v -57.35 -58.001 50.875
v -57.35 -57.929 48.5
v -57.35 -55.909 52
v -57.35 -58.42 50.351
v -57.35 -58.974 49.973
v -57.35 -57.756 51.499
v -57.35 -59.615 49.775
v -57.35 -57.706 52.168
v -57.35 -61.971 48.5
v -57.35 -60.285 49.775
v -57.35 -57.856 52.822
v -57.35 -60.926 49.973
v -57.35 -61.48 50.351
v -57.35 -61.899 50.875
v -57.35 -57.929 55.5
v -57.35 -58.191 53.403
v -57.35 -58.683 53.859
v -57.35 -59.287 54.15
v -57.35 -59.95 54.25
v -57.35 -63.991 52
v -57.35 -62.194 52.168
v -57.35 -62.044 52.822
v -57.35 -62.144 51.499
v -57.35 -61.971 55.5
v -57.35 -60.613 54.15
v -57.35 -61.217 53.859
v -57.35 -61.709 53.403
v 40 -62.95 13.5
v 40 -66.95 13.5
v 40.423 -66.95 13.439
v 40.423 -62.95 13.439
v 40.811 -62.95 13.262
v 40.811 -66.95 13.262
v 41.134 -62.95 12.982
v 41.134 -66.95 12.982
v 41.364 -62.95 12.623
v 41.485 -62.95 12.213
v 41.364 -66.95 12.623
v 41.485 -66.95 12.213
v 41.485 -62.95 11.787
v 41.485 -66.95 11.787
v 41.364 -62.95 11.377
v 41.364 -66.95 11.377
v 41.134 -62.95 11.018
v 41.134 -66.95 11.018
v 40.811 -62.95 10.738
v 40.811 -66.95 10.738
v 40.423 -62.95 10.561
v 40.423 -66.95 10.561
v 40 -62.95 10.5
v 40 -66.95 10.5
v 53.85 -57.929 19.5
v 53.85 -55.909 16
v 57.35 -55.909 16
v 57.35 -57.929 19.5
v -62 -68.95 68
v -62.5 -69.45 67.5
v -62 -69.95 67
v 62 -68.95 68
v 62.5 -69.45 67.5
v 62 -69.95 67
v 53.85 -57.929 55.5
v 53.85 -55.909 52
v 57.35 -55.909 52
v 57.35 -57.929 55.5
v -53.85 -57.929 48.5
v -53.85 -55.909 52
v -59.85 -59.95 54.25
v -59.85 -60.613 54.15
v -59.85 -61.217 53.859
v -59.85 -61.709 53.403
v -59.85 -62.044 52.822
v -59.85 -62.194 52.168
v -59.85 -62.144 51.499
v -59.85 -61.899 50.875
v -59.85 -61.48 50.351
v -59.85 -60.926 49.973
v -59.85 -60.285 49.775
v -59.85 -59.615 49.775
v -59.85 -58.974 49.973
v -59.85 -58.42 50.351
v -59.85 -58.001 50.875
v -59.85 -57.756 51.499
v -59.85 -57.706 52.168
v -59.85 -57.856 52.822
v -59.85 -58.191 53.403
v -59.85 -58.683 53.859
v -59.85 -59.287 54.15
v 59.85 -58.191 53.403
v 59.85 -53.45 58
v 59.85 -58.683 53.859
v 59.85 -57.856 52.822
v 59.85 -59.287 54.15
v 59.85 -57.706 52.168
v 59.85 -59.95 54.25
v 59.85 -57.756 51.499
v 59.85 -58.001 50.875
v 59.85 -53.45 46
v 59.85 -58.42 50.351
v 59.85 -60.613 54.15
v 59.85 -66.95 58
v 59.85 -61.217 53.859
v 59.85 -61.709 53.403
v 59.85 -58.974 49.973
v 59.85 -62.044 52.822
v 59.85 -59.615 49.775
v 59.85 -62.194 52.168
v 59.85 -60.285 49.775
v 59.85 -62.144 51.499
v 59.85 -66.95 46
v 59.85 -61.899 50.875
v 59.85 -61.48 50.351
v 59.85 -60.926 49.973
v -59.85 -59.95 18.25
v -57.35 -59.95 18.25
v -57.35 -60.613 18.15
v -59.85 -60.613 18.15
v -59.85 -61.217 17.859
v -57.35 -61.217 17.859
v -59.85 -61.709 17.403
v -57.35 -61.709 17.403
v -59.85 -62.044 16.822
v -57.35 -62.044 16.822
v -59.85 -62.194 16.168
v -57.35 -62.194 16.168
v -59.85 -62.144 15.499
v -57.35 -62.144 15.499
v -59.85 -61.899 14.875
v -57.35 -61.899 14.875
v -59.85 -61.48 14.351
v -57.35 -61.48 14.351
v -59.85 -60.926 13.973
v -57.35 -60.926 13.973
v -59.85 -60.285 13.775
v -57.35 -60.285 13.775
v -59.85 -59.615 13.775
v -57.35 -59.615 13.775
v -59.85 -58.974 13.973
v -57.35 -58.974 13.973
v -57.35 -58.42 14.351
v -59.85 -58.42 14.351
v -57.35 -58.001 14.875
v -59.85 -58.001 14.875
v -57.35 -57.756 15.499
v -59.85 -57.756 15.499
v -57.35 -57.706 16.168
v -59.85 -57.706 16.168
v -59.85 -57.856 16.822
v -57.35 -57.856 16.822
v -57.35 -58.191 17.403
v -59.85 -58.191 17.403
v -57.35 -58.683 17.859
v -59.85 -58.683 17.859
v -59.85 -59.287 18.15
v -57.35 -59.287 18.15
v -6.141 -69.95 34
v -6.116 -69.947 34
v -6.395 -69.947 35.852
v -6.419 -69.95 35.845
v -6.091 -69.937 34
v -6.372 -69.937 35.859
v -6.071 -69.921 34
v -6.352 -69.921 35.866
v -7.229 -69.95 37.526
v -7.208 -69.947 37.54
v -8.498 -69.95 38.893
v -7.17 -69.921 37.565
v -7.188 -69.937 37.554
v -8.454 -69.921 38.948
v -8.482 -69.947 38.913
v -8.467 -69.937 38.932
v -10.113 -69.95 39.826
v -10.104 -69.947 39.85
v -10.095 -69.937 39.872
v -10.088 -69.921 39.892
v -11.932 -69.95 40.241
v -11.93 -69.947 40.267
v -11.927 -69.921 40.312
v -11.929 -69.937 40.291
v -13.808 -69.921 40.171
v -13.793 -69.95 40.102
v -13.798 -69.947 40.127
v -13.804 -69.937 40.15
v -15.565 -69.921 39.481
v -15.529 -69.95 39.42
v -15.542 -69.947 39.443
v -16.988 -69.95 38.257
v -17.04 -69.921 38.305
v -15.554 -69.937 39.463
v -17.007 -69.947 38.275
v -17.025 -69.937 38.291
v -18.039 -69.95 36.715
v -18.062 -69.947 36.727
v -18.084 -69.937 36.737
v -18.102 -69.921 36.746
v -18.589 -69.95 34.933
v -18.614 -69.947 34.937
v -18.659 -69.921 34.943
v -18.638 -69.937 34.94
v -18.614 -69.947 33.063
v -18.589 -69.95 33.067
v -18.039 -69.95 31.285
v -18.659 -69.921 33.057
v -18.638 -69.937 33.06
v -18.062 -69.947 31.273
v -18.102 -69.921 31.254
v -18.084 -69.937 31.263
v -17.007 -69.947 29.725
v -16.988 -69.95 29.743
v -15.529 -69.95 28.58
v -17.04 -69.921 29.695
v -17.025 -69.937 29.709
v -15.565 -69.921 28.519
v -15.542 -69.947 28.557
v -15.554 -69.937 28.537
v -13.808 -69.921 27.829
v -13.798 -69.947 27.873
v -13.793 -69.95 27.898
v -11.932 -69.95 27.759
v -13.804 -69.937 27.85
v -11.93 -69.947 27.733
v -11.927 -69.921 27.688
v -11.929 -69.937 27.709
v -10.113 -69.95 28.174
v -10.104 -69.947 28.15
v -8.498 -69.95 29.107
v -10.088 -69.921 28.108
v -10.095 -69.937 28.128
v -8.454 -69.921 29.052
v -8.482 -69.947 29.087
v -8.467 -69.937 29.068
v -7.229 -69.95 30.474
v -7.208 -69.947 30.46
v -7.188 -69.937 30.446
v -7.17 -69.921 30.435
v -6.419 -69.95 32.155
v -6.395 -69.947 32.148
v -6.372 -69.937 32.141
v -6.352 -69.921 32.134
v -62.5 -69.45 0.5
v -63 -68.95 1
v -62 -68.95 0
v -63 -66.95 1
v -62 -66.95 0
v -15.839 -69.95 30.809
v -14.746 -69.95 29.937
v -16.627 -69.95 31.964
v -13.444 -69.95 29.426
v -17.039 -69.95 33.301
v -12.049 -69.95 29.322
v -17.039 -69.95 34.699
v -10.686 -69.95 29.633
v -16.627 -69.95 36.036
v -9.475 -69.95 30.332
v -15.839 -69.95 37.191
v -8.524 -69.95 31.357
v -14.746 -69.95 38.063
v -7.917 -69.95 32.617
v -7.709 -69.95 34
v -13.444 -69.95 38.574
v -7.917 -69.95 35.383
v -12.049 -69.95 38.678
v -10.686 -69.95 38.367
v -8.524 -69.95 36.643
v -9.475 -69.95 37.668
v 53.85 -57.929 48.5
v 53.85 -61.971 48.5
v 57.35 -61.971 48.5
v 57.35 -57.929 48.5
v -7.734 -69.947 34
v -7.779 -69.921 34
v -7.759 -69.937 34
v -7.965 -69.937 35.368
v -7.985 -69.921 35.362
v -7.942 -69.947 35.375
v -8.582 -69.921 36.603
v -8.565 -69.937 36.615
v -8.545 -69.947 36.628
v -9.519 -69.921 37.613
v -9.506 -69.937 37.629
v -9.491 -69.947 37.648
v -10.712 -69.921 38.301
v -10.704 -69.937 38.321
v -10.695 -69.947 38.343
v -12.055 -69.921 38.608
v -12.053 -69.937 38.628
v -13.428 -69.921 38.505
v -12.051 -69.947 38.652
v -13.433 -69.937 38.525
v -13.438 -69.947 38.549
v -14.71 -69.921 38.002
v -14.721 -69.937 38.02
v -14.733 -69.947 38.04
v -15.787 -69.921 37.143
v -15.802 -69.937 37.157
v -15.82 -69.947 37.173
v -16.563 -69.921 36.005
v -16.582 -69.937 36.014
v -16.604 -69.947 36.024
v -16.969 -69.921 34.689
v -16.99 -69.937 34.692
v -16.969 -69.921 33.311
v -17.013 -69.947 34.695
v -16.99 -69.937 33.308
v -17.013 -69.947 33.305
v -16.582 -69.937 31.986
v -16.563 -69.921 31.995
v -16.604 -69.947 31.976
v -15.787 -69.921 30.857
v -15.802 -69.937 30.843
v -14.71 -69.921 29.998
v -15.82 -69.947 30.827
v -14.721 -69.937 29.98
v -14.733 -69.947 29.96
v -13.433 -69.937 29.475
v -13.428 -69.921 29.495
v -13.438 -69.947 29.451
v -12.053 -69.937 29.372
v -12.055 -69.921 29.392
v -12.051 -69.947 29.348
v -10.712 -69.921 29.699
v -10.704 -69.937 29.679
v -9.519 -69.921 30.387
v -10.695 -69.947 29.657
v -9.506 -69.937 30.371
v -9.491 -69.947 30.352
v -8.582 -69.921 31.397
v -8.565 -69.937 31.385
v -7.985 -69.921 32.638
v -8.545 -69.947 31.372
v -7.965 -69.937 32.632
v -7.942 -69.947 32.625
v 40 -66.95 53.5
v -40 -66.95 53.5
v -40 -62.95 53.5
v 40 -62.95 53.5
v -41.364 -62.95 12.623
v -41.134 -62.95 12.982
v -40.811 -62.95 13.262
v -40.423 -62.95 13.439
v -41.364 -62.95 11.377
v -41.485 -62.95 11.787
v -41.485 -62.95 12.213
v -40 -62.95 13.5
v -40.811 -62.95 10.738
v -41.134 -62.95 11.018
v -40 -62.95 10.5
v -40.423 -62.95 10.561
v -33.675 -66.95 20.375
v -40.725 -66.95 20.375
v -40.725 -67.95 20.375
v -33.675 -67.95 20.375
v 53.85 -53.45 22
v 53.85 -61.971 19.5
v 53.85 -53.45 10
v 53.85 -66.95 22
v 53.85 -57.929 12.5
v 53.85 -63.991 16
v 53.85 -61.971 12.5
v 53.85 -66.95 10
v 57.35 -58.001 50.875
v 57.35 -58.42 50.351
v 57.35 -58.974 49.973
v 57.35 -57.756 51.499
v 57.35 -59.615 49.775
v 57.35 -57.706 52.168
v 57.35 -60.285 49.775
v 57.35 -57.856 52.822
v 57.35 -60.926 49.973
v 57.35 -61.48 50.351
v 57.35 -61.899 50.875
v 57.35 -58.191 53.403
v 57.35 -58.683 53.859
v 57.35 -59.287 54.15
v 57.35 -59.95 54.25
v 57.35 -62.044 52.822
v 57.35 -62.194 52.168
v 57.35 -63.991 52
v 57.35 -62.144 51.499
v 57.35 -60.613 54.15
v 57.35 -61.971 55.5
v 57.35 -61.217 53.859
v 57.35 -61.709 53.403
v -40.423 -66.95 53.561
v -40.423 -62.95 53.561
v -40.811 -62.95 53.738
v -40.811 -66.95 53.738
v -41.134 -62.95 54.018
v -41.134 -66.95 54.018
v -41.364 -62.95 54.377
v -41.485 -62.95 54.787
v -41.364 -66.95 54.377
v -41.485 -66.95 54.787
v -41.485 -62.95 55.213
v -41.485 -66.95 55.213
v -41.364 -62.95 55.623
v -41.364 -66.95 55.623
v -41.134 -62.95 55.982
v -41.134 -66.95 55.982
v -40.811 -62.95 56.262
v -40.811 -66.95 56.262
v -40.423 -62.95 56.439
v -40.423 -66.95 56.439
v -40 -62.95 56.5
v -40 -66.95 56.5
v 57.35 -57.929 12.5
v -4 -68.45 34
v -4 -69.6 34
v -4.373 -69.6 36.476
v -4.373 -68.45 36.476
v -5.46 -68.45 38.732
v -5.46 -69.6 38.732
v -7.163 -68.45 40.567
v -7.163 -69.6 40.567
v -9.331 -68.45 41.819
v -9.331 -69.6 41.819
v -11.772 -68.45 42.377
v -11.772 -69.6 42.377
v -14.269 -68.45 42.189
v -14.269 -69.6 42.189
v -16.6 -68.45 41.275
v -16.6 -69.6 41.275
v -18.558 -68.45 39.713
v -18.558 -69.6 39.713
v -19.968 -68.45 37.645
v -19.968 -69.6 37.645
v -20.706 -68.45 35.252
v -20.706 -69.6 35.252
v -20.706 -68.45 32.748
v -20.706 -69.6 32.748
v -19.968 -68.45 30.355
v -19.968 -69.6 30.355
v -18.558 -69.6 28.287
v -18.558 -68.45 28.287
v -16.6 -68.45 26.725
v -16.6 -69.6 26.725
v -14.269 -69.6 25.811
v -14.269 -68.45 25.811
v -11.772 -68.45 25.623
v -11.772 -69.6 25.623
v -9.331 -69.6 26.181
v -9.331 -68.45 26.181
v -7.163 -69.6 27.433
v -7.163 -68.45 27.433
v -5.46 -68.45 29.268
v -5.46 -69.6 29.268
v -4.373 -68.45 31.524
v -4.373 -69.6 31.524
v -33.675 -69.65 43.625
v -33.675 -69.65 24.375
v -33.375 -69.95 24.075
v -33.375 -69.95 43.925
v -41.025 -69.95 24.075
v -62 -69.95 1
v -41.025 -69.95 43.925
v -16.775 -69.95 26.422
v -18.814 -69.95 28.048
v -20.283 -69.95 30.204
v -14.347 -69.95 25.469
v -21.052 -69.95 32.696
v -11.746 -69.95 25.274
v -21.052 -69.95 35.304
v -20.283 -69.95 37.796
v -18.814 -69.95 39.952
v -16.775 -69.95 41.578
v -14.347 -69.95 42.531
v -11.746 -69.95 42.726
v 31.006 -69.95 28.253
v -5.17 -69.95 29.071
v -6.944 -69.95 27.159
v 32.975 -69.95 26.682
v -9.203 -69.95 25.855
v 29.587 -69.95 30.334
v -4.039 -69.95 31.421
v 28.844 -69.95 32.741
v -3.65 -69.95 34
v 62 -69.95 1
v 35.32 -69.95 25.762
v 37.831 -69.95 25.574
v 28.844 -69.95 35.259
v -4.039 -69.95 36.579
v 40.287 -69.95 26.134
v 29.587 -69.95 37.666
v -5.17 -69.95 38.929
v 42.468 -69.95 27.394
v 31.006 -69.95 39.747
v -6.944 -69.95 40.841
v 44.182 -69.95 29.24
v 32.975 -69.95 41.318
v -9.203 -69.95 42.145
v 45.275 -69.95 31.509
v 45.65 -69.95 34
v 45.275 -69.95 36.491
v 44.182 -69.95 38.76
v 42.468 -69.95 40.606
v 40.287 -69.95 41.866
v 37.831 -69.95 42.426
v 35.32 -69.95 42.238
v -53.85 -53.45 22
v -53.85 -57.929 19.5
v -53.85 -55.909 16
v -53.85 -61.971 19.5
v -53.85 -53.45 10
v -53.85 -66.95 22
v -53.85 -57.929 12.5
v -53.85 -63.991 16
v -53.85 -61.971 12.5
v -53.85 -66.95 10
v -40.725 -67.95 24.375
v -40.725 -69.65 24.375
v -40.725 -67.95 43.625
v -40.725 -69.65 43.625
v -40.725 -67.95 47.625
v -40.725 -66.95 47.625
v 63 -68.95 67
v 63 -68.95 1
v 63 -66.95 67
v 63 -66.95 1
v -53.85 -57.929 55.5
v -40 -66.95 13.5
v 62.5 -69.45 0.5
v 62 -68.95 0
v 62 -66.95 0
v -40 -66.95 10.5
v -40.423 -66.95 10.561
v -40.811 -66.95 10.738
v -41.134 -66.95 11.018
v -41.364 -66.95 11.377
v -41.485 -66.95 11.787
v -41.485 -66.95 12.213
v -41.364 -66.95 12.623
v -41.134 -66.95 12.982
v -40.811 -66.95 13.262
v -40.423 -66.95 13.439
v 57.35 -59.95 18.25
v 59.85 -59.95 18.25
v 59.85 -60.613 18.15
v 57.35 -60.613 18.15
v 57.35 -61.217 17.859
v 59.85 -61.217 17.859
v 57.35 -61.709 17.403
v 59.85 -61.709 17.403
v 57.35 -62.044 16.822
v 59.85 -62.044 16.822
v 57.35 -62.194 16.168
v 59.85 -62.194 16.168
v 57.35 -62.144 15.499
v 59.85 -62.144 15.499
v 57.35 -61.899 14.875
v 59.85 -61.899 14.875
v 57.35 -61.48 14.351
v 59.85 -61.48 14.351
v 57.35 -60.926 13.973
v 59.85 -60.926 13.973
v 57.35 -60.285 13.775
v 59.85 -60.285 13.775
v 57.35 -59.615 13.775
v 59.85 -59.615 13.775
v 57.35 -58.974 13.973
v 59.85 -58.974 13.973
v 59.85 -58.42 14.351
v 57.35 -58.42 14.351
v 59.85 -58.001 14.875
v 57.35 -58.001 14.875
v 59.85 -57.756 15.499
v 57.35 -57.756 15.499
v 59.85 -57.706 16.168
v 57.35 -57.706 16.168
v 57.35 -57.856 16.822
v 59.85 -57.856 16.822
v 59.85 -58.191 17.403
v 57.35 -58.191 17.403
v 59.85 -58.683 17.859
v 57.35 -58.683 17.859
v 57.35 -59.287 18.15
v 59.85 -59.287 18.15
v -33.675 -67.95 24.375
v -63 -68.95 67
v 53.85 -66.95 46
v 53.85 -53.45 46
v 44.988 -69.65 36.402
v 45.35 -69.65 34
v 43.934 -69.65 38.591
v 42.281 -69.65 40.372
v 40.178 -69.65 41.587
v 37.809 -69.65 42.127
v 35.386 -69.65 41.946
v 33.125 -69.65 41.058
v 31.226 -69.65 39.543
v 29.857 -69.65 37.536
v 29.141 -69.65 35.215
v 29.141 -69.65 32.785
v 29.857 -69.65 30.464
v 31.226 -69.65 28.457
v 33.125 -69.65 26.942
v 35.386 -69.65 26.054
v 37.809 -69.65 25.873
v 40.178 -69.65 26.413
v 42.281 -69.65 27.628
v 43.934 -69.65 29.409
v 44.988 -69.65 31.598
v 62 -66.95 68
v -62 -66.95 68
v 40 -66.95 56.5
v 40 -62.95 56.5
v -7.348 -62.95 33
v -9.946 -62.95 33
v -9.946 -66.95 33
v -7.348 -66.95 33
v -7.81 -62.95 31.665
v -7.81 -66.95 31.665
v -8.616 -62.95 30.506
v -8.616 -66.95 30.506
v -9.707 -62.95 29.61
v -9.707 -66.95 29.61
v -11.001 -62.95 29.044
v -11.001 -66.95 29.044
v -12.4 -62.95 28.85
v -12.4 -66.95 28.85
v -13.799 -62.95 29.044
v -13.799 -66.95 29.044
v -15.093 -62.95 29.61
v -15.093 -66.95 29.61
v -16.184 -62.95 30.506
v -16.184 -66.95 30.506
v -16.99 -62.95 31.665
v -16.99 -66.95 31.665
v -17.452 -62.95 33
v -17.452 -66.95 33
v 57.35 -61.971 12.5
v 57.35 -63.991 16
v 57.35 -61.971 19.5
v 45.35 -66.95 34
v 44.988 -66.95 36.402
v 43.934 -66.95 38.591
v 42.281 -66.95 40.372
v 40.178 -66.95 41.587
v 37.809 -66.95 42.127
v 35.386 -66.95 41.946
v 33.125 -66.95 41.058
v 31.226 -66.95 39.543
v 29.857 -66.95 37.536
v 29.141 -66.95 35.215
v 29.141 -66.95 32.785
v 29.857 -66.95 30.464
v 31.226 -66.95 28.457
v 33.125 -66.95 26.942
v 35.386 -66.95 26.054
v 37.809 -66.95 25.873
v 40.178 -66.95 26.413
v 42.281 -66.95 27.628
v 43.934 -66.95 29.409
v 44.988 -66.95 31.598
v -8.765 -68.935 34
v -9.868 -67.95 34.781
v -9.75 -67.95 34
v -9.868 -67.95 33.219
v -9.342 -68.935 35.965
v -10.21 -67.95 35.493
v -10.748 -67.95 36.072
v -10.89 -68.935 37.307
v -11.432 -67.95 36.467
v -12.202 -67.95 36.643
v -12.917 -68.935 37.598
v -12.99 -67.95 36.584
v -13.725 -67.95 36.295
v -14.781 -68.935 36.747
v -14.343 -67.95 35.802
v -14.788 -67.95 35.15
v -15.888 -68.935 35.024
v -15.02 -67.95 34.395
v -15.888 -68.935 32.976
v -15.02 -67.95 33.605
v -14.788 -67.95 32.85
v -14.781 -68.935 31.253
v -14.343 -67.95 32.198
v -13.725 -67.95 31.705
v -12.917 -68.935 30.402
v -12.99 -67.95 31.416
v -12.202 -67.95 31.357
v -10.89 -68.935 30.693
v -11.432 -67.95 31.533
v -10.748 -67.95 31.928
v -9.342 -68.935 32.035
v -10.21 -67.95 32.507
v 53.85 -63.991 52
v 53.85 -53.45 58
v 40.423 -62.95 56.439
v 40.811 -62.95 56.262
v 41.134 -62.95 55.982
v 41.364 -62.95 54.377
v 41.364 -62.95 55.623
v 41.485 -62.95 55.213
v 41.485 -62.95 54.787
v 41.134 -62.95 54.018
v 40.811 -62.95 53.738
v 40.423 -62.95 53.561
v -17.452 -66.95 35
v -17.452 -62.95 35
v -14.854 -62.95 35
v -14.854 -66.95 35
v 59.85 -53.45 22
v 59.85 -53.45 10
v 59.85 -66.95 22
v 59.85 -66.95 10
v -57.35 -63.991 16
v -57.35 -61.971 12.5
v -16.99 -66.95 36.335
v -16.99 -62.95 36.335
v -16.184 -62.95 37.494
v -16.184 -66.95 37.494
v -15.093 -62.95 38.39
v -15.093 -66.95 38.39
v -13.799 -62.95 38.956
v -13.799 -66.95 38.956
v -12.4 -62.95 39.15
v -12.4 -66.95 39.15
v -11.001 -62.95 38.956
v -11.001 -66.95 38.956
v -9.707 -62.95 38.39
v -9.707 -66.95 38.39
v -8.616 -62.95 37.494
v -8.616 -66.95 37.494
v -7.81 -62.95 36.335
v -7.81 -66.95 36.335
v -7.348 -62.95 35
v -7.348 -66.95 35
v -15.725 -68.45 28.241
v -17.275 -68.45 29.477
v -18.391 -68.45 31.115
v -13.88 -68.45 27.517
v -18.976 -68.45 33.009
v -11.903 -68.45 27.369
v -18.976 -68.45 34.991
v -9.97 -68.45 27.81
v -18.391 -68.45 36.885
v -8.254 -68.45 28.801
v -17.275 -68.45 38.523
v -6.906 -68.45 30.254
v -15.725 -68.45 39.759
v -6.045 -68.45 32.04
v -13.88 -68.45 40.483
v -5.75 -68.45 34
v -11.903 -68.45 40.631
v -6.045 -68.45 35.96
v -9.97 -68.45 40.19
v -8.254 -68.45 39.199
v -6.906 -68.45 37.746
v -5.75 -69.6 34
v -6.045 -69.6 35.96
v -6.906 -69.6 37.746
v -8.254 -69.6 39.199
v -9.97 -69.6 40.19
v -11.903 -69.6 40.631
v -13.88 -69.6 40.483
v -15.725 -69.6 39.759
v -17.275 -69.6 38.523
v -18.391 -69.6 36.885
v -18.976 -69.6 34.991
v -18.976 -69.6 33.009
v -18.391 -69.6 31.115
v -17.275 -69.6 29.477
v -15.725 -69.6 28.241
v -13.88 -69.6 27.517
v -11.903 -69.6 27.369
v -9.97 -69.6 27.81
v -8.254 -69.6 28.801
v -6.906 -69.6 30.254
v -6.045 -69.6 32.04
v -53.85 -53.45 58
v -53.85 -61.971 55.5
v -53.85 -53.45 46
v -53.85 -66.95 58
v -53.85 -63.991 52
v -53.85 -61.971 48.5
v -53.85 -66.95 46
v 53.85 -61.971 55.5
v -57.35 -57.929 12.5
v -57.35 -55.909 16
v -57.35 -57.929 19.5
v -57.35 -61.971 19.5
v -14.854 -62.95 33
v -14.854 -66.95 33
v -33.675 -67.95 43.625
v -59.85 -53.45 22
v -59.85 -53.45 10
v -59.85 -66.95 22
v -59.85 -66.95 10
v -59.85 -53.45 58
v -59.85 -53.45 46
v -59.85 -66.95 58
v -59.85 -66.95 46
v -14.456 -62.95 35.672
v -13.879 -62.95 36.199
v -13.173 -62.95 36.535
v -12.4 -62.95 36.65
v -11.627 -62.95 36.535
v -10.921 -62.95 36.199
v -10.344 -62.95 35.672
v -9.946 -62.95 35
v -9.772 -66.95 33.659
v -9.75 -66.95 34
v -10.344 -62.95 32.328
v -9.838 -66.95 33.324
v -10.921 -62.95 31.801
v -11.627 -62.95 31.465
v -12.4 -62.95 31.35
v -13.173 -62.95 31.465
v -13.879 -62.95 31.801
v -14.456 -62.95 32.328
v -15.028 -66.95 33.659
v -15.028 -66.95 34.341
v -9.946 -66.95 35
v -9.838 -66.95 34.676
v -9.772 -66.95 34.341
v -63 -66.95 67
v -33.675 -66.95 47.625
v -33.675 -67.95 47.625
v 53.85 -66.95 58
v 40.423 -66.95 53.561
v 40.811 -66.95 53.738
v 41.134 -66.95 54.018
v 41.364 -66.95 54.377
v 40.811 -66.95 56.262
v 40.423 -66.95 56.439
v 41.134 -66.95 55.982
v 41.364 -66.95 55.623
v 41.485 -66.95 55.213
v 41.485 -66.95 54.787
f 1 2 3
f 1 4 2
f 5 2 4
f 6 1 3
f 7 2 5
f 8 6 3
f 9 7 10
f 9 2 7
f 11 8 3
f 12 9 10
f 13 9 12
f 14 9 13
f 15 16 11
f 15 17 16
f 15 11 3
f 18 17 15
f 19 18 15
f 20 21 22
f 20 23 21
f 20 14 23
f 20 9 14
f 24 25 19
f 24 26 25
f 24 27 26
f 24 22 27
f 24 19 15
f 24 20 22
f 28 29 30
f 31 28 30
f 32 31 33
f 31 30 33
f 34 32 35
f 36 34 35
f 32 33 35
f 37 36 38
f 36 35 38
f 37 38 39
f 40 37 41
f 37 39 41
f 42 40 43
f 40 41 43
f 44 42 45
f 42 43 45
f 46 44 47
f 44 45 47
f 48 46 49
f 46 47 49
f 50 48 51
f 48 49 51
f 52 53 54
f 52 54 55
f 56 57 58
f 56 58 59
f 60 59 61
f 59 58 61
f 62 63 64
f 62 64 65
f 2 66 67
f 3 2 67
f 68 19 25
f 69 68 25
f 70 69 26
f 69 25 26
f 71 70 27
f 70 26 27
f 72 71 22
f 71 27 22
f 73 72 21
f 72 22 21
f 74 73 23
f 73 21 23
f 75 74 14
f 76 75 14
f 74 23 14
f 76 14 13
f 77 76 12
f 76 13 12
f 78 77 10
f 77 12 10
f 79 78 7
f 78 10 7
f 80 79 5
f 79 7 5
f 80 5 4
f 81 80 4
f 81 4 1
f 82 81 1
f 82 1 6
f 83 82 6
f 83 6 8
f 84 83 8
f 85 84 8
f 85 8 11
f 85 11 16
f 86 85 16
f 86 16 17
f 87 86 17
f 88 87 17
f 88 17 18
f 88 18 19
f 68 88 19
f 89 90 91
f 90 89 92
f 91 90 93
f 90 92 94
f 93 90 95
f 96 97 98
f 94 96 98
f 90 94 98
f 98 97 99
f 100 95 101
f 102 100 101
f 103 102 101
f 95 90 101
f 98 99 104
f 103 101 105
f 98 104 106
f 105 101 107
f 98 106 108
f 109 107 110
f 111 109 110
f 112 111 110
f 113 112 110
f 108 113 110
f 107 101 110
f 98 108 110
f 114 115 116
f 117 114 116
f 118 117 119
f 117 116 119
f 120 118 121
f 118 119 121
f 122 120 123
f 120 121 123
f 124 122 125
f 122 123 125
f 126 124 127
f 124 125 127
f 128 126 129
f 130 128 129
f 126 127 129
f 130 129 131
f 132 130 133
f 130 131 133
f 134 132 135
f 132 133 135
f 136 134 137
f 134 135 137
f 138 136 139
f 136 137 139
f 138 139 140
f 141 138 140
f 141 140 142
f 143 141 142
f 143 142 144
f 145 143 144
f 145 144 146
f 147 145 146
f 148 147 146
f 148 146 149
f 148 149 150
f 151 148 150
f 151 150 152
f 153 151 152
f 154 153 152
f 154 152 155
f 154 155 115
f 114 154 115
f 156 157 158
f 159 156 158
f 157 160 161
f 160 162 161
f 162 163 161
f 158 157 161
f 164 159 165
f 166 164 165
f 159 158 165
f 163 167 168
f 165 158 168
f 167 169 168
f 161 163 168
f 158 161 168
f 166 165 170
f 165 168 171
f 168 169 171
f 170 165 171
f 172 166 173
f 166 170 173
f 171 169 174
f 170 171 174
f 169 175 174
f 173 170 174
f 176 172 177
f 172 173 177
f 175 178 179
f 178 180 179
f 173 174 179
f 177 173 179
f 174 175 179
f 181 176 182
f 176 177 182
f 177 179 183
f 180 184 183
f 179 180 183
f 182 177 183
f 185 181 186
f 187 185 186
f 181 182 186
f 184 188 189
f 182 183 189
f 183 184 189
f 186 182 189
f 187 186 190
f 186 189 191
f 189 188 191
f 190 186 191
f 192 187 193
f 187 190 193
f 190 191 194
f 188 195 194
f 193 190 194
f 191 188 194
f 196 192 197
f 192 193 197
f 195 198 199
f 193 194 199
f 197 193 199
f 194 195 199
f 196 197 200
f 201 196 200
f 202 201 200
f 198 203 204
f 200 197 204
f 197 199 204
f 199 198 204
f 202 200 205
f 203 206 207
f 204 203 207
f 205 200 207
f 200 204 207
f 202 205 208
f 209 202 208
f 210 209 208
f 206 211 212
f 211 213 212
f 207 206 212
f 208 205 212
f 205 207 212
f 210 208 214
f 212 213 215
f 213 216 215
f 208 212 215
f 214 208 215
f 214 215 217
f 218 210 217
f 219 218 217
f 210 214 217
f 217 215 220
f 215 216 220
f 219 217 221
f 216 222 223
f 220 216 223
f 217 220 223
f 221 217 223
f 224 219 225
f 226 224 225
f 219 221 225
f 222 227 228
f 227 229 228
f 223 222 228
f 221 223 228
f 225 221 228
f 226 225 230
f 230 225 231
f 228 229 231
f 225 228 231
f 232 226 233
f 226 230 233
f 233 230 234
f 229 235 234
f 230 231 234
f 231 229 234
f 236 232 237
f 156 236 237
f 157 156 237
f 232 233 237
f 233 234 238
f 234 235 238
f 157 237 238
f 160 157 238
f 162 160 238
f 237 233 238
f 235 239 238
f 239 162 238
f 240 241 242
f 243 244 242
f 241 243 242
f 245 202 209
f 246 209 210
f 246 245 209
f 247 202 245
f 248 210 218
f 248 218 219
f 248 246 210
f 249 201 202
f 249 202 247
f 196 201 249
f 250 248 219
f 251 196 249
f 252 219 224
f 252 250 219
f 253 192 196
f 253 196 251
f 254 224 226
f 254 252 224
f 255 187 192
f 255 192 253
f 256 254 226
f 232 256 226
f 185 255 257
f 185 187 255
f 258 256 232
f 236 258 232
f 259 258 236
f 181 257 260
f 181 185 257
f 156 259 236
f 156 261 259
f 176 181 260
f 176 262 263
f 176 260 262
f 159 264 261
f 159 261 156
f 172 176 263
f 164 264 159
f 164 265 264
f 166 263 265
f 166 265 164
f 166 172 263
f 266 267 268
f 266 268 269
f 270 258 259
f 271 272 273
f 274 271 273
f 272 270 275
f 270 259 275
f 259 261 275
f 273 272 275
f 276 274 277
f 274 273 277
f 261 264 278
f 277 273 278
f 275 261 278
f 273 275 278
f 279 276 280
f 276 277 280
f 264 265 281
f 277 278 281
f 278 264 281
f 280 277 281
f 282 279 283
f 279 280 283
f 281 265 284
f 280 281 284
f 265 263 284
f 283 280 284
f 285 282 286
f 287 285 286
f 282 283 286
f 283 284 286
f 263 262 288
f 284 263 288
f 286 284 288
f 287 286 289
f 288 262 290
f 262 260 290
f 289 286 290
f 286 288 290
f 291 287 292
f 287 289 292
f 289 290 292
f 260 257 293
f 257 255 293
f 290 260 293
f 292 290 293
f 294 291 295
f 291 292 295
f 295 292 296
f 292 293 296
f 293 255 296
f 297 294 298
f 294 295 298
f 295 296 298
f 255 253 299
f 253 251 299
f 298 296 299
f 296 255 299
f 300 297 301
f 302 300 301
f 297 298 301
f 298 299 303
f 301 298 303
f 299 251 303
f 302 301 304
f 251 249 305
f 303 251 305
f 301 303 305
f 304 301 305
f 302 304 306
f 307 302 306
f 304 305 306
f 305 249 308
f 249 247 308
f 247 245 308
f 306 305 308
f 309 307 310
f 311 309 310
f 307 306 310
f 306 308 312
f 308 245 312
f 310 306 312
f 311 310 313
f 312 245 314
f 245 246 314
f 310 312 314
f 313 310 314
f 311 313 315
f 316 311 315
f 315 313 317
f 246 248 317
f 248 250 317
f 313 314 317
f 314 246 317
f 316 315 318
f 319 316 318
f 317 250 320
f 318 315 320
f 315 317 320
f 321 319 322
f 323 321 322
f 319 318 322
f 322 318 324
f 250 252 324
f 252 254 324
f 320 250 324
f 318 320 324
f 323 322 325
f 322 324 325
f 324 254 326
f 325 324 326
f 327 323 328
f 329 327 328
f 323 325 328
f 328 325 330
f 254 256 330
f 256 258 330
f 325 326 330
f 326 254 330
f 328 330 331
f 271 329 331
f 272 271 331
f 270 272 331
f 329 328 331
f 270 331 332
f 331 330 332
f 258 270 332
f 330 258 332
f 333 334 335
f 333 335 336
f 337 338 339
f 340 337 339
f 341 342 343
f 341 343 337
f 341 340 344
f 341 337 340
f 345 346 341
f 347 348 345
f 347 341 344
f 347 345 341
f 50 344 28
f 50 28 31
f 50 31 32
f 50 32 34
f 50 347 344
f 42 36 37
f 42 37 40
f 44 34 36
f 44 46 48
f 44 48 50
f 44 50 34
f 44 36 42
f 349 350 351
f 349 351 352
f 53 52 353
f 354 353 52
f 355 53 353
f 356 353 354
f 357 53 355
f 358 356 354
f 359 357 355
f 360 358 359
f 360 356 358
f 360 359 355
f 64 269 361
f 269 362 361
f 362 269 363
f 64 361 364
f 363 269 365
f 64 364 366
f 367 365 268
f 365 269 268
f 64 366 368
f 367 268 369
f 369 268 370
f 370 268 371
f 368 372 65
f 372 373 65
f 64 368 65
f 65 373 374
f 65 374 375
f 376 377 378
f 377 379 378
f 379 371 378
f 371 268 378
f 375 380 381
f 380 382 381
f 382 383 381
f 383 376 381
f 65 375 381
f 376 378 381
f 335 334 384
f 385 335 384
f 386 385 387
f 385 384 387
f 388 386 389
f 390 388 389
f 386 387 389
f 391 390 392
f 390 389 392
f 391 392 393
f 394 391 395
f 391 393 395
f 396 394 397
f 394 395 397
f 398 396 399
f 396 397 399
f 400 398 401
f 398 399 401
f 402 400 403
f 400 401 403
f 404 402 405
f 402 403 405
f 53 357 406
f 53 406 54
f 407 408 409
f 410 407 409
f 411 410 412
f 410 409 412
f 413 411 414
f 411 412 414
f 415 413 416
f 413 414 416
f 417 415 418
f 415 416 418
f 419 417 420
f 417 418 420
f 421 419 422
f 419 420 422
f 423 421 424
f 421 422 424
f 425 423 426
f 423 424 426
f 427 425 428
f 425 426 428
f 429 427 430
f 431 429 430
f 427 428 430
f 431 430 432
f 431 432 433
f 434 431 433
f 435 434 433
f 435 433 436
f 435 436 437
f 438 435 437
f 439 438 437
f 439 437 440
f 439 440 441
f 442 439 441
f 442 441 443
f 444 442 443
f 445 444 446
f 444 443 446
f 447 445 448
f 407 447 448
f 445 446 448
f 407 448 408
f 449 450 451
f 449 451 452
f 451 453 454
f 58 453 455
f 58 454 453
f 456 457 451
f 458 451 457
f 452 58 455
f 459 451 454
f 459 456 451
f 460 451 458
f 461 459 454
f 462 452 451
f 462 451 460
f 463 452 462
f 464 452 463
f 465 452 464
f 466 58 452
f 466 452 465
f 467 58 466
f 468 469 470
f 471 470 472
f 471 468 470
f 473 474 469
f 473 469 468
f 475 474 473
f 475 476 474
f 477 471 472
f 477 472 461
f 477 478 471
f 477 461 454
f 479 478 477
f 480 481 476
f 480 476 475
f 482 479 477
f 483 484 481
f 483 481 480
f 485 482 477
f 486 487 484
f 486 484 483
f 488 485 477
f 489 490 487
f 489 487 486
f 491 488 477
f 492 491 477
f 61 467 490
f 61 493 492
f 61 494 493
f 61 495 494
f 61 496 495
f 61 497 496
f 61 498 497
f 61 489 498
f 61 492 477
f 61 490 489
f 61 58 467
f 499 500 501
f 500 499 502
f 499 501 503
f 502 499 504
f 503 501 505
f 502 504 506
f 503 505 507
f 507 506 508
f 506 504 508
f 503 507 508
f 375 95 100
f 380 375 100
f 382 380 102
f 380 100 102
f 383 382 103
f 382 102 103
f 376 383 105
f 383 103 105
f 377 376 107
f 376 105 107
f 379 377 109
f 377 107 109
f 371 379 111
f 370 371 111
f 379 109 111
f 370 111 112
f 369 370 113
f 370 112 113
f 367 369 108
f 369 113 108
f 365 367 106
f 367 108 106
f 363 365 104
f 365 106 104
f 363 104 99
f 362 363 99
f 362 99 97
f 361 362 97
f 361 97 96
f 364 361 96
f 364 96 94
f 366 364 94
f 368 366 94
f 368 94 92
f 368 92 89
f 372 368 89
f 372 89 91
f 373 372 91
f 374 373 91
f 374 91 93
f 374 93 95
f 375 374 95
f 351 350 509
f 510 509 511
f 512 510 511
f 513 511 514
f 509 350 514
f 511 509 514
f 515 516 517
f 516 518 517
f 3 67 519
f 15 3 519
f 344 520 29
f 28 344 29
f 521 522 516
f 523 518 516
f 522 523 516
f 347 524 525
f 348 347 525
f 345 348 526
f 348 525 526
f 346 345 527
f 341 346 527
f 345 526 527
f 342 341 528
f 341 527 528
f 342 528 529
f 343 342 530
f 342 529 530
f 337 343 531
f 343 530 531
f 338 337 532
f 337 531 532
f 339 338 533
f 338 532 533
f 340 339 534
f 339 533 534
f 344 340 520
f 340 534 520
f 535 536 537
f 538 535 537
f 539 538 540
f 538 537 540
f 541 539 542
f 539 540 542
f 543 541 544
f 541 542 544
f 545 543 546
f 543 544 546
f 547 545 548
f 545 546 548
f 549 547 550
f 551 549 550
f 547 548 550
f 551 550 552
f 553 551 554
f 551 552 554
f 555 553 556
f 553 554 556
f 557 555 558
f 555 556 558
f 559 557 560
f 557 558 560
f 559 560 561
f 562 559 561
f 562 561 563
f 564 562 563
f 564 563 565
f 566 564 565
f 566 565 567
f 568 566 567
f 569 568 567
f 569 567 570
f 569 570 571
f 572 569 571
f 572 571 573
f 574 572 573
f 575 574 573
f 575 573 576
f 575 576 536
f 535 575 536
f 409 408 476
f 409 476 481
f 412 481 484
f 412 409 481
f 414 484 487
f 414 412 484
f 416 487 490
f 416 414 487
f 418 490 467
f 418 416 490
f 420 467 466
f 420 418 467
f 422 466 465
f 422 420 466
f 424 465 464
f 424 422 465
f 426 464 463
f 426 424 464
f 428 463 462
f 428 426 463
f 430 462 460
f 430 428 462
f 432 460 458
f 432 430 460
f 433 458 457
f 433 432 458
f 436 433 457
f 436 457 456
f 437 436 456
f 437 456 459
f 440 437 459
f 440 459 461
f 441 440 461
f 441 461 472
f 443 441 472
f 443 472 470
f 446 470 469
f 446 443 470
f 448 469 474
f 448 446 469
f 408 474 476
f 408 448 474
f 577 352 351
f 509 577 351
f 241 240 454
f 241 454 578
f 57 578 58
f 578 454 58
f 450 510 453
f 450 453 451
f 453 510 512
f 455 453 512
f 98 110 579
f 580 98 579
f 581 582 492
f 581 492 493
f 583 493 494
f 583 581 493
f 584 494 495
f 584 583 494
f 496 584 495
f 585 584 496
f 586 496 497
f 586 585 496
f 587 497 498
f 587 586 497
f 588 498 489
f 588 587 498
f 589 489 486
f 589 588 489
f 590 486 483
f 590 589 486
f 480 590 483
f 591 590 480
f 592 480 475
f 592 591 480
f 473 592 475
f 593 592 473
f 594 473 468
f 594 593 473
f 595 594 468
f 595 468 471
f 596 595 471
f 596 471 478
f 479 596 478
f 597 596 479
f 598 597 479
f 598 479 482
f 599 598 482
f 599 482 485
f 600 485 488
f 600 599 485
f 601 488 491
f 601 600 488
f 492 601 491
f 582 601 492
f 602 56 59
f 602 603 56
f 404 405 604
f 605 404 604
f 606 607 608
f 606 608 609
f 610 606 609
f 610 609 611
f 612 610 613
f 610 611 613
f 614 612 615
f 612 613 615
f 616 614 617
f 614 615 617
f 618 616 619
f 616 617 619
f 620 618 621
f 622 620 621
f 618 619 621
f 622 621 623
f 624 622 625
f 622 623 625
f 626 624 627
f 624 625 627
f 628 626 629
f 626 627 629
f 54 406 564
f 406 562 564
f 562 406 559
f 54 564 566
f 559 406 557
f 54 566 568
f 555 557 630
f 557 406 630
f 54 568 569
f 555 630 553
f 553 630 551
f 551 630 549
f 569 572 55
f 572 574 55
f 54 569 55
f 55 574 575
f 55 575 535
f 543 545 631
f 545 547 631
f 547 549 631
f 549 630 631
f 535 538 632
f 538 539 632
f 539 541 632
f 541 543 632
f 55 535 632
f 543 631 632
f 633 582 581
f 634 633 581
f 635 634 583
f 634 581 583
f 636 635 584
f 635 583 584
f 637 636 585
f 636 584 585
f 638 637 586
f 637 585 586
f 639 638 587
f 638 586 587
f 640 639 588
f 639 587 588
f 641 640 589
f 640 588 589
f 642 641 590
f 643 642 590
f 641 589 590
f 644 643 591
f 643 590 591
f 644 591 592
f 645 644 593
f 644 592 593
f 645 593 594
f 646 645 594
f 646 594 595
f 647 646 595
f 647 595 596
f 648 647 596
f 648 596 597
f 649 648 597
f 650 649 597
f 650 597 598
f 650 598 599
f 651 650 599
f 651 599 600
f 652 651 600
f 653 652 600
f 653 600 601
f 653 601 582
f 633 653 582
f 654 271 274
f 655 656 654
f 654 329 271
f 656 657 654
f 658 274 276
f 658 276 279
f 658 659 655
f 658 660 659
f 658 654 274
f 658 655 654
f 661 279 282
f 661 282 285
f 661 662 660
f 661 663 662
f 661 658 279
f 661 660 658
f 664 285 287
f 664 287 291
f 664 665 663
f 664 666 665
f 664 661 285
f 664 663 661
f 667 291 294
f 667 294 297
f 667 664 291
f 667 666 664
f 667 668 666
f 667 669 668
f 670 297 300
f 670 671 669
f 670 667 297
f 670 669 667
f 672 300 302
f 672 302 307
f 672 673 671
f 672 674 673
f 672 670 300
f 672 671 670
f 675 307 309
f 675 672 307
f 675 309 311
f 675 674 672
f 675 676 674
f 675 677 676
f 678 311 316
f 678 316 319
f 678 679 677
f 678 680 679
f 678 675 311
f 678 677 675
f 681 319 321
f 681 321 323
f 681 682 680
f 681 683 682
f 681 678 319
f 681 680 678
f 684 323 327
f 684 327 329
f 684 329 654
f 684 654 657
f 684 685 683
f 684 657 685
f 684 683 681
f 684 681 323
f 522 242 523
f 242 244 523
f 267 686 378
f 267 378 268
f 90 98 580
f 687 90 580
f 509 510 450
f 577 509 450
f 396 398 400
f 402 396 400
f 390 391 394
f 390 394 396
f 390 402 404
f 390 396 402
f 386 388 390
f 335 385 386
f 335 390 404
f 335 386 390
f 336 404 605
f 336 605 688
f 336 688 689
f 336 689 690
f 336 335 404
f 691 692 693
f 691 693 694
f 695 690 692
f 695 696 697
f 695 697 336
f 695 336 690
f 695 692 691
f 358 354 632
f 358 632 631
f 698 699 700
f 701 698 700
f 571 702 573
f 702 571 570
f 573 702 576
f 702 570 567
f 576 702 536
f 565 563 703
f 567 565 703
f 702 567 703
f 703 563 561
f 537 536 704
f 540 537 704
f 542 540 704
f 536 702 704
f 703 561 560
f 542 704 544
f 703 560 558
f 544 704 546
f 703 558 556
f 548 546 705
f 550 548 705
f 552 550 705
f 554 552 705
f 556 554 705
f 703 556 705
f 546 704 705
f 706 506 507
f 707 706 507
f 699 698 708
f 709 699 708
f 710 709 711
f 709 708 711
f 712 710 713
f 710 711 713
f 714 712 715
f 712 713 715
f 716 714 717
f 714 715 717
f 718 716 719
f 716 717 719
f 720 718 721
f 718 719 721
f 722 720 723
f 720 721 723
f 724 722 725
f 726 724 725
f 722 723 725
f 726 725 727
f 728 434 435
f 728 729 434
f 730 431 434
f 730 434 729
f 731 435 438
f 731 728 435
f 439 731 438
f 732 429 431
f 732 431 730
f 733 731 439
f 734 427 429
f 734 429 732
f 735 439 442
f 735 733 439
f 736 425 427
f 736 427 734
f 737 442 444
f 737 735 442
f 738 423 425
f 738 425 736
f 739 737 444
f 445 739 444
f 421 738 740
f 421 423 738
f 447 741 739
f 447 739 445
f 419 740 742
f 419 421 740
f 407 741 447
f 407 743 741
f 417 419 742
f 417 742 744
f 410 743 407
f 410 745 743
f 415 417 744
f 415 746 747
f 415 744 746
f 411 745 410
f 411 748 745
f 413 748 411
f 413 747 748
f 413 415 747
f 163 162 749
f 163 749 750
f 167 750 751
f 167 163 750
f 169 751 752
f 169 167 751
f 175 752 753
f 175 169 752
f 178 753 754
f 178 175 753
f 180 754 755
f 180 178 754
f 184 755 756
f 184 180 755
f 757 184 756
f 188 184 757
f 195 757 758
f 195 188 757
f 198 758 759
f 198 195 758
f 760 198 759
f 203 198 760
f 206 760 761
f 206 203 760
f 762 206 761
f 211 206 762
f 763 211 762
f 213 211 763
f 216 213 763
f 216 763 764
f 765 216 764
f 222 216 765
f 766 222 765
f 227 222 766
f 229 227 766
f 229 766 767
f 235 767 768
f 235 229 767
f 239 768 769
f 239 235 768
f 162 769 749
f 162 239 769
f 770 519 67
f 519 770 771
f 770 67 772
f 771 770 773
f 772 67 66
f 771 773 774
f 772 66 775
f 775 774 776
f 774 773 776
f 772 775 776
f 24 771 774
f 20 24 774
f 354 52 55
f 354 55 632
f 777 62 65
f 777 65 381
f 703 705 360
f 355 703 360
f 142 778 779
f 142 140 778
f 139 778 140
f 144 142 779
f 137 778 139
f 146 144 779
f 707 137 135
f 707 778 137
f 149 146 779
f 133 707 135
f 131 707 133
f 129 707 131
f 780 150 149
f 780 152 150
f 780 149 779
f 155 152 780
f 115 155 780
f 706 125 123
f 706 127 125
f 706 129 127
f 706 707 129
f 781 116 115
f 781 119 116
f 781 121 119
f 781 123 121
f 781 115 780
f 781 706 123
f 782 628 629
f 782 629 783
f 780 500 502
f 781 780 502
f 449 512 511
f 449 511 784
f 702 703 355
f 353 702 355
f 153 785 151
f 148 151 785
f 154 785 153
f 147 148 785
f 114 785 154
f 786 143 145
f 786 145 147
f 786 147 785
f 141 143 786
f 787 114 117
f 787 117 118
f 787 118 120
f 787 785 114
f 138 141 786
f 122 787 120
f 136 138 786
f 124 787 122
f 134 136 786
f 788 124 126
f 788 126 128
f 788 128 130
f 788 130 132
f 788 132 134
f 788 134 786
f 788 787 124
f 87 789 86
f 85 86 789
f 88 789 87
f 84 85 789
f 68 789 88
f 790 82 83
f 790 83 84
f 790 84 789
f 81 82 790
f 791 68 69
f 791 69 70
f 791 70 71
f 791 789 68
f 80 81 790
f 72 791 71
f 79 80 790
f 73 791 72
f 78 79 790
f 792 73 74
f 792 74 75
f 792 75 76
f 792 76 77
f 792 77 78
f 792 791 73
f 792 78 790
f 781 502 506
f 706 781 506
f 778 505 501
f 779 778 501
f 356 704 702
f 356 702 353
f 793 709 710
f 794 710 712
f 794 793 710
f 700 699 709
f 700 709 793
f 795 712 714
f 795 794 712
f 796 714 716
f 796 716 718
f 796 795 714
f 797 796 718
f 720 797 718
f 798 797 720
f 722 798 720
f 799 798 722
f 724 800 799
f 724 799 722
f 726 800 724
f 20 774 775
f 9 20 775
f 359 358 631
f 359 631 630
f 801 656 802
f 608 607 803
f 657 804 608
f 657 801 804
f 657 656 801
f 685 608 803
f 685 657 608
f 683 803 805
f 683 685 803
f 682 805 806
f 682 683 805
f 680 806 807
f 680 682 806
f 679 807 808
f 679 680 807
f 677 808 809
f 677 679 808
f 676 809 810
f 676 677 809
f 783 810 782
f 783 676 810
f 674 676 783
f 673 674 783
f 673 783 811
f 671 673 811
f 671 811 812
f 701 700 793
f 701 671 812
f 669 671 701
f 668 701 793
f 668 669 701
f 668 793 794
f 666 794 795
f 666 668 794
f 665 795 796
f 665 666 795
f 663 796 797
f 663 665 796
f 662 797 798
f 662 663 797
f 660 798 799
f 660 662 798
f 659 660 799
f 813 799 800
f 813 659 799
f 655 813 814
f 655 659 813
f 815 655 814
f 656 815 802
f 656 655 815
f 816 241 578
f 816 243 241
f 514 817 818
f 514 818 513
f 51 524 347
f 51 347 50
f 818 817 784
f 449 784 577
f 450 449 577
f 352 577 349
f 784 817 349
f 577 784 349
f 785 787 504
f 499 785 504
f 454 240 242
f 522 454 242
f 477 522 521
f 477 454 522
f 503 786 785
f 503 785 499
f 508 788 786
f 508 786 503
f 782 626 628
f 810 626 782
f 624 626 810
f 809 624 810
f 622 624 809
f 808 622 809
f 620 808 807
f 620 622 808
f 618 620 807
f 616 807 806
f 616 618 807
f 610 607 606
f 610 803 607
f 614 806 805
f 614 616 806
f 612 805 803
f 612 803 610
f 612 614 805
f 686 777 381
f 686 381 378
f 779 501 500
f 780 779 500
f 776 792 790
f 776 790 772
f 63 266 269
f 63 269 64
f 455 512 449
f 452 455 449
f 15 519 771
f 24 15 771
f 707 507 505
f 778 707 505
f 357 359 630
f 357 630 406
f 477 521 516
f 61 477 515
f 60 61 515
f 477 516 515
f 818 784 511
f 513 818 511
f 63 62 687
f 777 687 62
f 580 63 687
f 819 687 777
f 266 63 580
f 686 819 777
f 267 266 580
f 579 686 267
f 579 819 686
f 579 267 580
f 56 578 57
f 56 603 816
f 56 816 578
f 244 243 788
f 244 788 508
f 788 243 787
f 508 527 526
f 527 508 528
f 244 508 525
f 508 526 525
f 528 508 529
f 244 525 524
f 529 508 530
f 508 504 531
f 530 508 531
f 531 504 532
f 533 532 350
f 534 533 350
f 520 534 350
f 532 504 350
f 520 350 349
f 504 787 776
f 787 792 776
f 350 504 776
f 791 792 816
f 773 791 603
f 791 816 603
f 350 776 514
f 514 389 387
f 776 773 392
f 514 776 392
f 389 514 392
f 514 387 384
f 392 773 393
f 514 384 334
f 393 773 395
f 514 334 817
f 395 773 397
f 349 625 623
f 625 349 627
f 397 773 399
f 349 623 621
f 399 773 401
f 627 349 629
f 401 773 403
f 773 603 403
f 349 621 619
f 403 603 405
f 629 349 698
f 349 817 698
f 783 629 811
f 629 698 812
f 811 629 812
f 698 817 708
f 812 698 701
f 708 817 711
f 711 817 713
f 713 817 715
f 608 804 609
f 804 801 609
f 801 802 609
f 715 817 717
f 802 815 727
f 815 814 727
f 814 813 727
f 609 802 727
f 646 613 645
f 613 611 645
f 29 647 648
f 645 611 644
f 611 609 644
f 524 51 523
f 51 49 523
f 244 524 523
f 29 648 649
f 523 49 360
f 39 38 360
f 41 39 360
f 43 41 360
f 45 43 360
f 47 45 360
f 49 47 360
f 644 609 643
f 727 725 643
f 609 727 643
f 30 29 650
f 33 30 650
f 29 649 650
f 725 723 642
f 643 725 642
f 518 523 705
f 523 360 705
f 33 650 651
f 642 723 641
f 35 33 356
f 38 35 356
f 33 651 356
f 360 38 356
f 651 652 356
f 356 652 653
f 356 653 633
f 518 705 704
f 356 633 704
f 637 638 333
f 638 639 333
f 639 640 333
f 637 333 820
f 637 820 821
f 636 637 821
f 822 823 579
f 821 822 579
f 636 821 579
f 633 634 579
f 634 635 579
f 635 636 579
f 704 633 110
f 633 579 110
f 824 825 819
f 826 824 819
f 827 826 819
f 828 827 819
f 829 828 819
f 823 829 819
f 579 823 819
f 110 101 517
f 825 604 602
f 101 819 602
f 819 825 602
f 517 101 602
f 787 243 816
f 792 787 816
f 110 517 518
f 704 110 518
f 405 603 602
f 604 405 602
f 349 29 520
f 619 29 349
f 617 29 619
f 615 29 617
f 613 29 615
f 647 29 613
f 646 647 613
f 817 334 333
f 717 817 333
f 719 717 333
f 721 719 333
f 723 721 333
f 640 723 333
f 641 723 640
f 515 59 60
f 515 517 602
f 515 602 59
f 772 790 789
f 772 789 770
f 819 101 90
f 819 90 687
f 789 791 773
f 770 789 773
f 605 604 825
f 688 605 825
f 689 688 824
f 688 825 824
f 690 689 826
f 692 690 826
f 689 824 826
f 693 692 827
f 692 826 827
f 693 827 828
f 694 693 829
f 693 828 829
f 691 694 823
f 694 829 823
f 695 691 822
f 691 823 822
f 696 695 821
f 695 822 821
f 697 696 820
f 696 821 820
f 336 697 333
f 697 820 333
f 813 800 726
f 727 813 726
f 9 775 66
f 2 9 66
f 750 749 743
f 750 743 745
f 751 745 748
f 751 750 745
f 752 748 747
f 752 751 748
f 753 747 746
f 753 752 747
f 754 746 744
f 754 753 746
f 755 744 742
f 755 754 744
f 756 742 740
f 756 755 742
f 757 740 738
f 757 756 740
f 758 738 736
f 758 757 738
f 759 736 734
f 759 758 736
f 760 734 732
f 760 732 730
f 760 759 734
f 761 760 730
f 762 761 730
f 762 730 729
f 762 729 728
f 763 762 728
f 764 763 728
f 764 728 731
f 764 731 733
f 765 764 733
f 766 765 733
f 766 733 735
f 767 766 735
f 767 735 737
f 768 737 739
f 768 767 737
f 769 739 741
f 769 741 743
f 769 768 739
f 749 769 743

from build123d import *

# Parameters (mm, degrees)
SKETCH010_W     = 126
SKETCH010_H     = 68
PAD006_DEPTH    = 3
SKETCH011_W     = 6
SKETCH011_H     = 12
PAD007_DEPTH    = 13.5
SKETCH012_R     = 2.25
POCKET004_DEPTH = 122.851
POCKET005_DEPTH = 3.5
CHAMFER003_SIZE = 1
CHAMFER004_SIZE = 1
CHAMFER007_SIZE = 1
SKETCH024_R     = 2.65
SKETCH024_R_2   = 8.15
SKETCH024_W     = 7.05
SKETCH024_H     = 19.25
POCKET012_DEPTH = 16.501
POCKET013_DEPTH = 1
CHAMFER010_SIZE = 2
SKETCH026_R     = 8.4
SKETCH026_R_2   = 6.65
POCKET014_DEPTH = 1.5
CHAMFER011_SIZE = 0.35
CHAMFER012_SIZE = 0.3
SKETCH030_R     = 5.15
SKETCH030_R_2   = 2.65
PAD012_DEPTH    = 4
SKETCH031_W     = 10.3
SKETCH031_H     = 2
POCKET016_DEPTH = 4
PAD016_DEPTH    = 4
FILLET003_R     = 0.1


with BuildPart() as part:
    # Sketch010 → Pad006 (new body)
    with BuildSketch(Plane.XZ):
        with Locations((0, 34)):
            Rectangle(SKETCH010_W, SKETCH010_H)
    extrude(amount=PAD006_DEPTH)

    # Sketch011 (on Face5 of Pad006) → Pad007 (join)
    with BuildSketch(Plane(origin=(0, 0, 0), x_dir=(1, 0, 0), z_dir=(0, 1, 0))):
        with Locations((-56.85, -16)):
            Rectangle(SKETCH011_W, SKETCH011_H)
        with Locations((-56.85, -52)):
            Rectangle(SKETCH011_W, SKETCH011_H)
    pad007 = extrude(amount=PAD007_DEPTH)

    # Mirrored002: Pad007 across YZ
    add(pad007.mirror(Plane.YZ))

    # Sketch012 (on Face22 of Mirrored002) → Pocket004 (cut, through all)
    with BuildSketch(Plane(origin=(59.85, 0, 0), x_dir=(0, 0, 1), z_dir=(1, 0, 0))):
        with Locations((16, -7)):
            Circle(SKETCH012_R)
        with Locations((52, -7)):
            Circle(SKETCH012_R)
    extrude(amount=-POCKET004_DEPTH, mode=Mode.SUBTRACT)

    # Sketch013 (on Face10 of Pocket004) → Pocket005 (cut)
    with BuildSketch(Plane(origin=(-53.85, 0, 0), x_dir=(0, 0, 1), z_dir=(1, 0, 0))):
        Polygon((19.5, -9.020726), (19.5, -4.979274), (16, -2.958548), (12.5, -4.979274), (12.5, -9.020726), (16, -11.041452), align=None)
        Polygon((55.5, -9.020726), (55.5, -4.979274), (52, -2.958548), (48.5, -4.979274), (48.5, -9.020726), (52, -11.041452), align=None)
    pocket005 = extrude(amount=-POCKET005_DEPTH, mode=Mode.SUBTRACT)

    # Chamfer003
    chamfer003_edges = [part.edges().sort_by_distance(p)[0] for p in [
        (0, -3, 68),
        (63, -3, 34),
        (0, -3, 0),
        (-63, -3, 34),
    ]]
    chamfer(chamfer003_edges, length=CHAMFER003_SIZE)

    # Chamfer004
    chamfer004_edges = [part.edges().sort_by_distance(p)[0] for p in [
        (-63, -1, 68),
        (63, -1, 68),
    ]]
    chamfer(chamfer004_edges, length=CHAMFER004_SIZE)

    # Chamfer007
    chamfer007_edges = [part.edges().sort_by_distance(p)[0] for p in [
        (63, -1, 0),
        (-63, -1, 0),
    ]]
    chamfer(chamfer007_edges, length=CHAMFER007_SIZE)

    # Mirrored005: Pocket005 across YZ
    add(pocket005.mirror(Plane.YZ), mode=Mode.SUBTRACT)

    # Sketch024 (on Face62 of Mirrored005) → Pocket012 (cut, through all)
    with BuildSketch(Plane.XZ.offset(3)):
        with Locations((-12.4, 34)):
            Circle(SKETCH024_R)
        with Locations((37.2, 34)):
            Circle(SKETCH024_R_2)
        with Locations((-37.2, 34)):
            Rectangle(SKETCH024_W, SKETCH024_H)
    extrude(amount=-POCKET012_DEPTH, mode=Mode.SUBTRACT)

    # Sketch025 (on Face1 of Pocket012) → Pocket013 (cut)
    with BuildSketch(Plane(origin=(0, 0, 0), x_dir=(1, 0, 0), z_dir=(0, 1, 0))):
        Polygon((-40.725, -20.375), (-33.675, -20.375), (-33.675, -43.625), (-33.675, -47.625), (-40.725, -47.625), (-40.725, -24.375), align=None)
    extrude(amount=-POCKET013_DEPTH, mode=Mode.SUBTRACT)

    # Chamfer010
    chamfer010_edges = [part.edges().sort_by_distance(p)[0] for p in [
        (-15.05, -3, 34),
    ]]
    chamfer(chamfer010_edges, length=CHAMFER010_SIZE)

    # Sketch026 (on Face4 of Chamfer010) → Pocket014 (cut)
    with BuildSketch(Plane.XZ.offset(3)):
        with Locations((-12.4, 34)):
            Circle(SKETCH026_R)
        with Locations((-12.4, 34)):
            Circle(SKETCH026_R_2, mode=Mode.SUBTRACT)
    extrude(amount=-POCKET014_DEPTH, mode=Mode.SUBTRACT)

    # Chamfer011
    chamfer011_edges = [part.edges().sort_by_distance(p)[0] for p in [
        (-19.05, -3, 34),
        (-20.8, -3, 34),
    ]]
    chamfer(chamfer011_edges, length=CHAMFER011_SIZE)

    # Chamfer012
    chamfer012_edges = [part.edges().sort_by_distance(p)[0] for p in [
        (-37.2, -3, 24.375),
        (-40.725, -3, 34),
        (-33.675, -3, 34),
        (-37.2, -3, 43.625),
        (29.05, -3, 34),
    ]]
    chamfer(chamfer012_edges, length=CHAMFER012_SIZE)

    # Sketch030 (on Face3 of Chamfer012) → Pad012 (join)
    with BuildSketch(Plane(origin=(0, 0, 0), x_dir=(1, 0, 0), z_dir=(0, 1, 0))):
        with Locations((-12.4, -34)):
            Circle(SKETCH030_R)
        with Locations((-12.4, -34)):
            Circle(SKETCH030_R_2, mode=Mode.SUBTRACT)
    extrude(amount=PAD012_DEPTH)

    # Sketch031 (on Face83 of Pad012) → Pocket016 (cut)
    with BuildSketch(Plane(origin=(0, 4, 0), x_dir=(1, 0, 0), z_dir=(0, 1, 0))):
        with Locations((-12.4, -34)):
            Rectangle(SKETCH031_W, SKETCH031_H)
    extrude(amount=-POCKET016_DEPTH, mode=Mode.SUBTRACT)

    # Sketch035 (on Face3 of Pocket016) → Pad016 (join)
    with BuildSketch(Plane(origin=(0, 0, 0), x_dir=(1, 0, 0), z_dir=(0, 1, 0))):
        with BuildLine():
            ThreePointArc((-40, -53.5), (-41.5, -55), (-40, -56.5))
            Line((-40, -56.5), (40, -56.5))
            ThreePointArc((40, -56.5), (41.5, -55), (40, -53.5))
            Line((-40, -53.5), (40, -53.5))
        make_face()
        with BuildLine():
            ThreePointArc((-40, -10.5), (-41.5, -12), (-40, -13.5))
            Line((-40, -13.5), (40, -13.5))
            ThreePointArc((40, -13.5), (41.5, -12), (40, -10.5))
            Line((-40, -10.5), (40, -10.5))
        make_face()
    extrude(amount=PAD016_DEPTH)

    # Fillet003
    fillet003_edges = [part.edges().sort_by_distance(p)[0] for p in [
        (-18.7, -3, 34),
        (-17.05, -3, 34),
    ]]
    fillet(fillet003_edges, radius=FILLET003_R)


with BuildPart() as part_1:
    # Body003 placement: moved
    add(part.part.moved(Location((0, -66.95, 0))))


solid = part_1.part
